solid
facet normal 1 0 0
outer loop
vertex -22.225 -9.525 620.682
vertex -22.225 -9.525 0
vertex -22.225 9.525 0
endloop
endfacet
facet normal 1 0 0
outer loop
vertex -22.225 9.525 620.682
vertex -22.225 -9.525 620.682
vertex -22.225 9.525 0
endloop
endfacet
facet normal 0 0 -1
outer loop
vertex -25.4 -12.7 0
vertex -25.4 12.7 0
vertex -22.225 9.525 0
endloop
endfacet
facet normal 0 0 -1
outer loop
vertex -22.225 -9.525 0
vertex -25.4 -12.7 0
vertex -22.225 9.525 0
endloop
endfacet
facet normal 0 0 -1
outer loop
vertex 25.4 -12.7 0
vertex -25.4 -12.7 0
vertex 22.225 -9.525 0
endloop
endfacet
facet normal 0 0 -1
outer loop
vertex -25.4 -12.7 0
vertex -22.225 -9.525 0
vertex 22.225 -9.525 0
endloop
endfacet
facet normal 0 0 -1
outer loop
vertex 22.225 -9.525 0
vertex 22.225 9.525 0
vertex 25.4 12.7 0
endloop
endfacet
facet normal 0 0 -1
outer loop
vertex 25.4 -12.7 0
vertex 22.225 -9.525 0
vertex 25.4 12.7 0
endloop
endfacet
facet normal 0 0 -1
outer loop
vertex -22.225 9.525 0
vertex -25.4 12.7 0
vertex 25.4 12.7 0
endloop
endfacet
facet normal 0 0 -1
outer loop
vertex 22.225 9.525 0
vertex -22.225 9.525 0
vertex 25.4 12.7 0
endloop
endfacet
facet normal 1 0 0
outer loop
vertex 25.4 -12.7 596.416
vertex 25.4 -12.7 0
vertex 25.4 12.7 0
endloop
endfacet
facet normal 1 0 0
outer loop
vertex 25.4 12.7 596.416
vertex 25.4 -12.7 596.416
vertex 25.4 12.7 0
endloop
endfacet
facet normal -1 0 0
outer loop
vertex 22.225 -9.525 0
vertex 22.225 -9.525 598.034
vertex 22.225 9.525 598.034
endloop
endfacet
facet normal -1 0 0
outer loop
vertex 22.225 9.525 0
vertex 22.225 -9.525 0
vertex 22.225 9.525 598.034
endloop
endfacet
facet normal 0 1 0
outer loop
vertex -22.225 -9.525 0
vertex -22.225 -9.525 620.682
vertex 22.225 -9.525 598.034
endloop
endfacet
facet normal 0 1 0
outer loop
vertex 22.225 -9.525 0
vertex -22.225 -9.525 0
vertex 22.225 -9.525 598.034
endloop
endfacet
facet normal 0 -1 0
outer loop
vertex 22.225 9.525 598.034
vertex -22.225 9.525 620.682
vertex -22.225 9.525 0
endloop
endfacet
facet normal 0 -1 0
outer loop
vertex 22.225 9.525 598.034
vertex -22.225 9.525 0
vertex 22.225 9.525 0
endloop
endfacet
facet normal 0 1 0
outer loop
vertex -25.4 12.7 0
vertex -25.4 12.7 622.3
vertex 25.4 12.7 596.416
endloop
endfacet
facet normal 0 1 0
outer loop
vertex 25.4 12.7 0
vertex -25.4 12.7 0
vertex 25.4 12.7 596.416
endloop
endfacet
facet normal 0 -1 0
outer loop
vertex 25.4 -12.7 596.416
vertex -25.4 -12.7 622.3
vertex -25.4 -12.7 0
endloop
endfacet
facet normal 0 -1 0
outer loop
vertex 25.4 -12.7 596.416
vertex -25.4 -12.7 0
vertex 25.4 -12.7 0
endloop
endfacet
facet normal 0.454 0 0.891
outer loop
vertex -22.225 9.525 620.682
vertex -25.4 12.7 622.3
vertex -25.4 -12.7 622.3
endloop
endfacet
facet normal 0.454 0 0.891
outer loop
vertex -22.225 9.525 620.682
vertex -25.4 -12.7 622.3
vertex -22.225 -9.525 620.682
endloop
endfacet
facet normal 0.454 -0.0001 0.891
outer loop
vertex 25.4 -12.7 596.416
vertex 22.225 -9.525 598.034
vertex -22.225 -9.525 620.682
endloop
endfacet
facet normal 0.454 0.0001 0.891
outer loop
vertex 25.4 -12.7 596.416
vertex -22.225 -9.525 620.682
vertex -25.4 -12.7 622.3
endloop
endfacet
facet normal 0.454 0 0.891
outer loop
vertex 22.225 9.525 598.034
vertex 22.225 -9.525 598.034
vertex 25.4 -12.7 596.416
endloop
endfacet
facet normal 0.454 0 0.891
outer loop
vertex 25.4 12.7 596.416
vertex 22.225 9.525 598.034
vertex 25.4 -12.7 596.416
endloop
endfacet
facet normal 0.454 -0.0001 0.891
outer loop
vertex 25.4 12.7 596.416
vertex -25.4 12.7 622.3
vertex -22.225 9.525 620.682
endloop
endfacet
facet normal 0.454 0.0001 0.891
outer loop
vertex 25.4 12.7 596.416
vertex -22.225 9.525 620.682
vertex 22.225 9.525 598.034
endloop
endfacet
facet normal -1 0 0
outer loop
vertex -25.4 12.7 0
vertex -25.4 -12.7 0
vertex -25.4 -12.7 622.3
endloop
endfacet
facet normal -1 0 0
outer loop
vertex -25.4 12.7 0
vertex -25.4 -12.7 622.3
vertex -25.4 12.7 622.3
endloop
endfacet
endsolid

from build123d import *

# Parameters (mm, degrees)
SKETCH2_W           = 50.8
SKETCH2_H           = 25.4
SKETCH2_W_2         = 44.45
SKETCH2_H_2         = 19.05
BOSS_EXTRUDE1_DEPTH = 622.3
CUT_EXTRUDE1_REACH  = 625.336


with BuildPart() as part:
    # Sketch2 → Boss-Extrude1 (new body)
    with BuildSketch(Plane.XY):
        Rectangle(SKETCH2_W, SKETCH2_H)
        Rectangle(SKETCH2_W_2, SKETCH2_H_2, mode=Mode.SUBTRACT)
    extrude(amount=BOSS_EXTRUDE1_DEPTH)

    # Cut-Extrude1: up to this face of the body (flat: up to its plane)
    cut_extrude1_end = Plane(part.part.faces().sort_by_distance((0, -12.7, 311.15))[0])
    # Sketch3 → Cut-Extrude1 (cut, up to the picked face)
    with BuildSketch(Plane(origin=(0, 12.7, 0), x_dir=(1, 0, 0), z_dir=(0, 1, 0)), mode=Mode.PRIVATE) as cut_extrude1_sk1:
        Polygon((-25.4, -622.3), (25.4, -596.416107166), (25.4, -622.3), align=None)
    cut_extrude1_tool1 = split(extrude(cut_extrude1_sk1.sketch, amount=-CUT_EXTRUDE1_REACH, mode=Mode.PRIVATE), bisect_by=cut_extrude1_end, keep=Keep.BOTH, mode=Mode.PRIVATE)
    add(cut_extrude1_tool1.solids().sort_by(Axis((8.466667, 12.7, 613.672036), (0, -1, 0)))[0], mode=Mode.SUBTRACT)


solid = part.part
